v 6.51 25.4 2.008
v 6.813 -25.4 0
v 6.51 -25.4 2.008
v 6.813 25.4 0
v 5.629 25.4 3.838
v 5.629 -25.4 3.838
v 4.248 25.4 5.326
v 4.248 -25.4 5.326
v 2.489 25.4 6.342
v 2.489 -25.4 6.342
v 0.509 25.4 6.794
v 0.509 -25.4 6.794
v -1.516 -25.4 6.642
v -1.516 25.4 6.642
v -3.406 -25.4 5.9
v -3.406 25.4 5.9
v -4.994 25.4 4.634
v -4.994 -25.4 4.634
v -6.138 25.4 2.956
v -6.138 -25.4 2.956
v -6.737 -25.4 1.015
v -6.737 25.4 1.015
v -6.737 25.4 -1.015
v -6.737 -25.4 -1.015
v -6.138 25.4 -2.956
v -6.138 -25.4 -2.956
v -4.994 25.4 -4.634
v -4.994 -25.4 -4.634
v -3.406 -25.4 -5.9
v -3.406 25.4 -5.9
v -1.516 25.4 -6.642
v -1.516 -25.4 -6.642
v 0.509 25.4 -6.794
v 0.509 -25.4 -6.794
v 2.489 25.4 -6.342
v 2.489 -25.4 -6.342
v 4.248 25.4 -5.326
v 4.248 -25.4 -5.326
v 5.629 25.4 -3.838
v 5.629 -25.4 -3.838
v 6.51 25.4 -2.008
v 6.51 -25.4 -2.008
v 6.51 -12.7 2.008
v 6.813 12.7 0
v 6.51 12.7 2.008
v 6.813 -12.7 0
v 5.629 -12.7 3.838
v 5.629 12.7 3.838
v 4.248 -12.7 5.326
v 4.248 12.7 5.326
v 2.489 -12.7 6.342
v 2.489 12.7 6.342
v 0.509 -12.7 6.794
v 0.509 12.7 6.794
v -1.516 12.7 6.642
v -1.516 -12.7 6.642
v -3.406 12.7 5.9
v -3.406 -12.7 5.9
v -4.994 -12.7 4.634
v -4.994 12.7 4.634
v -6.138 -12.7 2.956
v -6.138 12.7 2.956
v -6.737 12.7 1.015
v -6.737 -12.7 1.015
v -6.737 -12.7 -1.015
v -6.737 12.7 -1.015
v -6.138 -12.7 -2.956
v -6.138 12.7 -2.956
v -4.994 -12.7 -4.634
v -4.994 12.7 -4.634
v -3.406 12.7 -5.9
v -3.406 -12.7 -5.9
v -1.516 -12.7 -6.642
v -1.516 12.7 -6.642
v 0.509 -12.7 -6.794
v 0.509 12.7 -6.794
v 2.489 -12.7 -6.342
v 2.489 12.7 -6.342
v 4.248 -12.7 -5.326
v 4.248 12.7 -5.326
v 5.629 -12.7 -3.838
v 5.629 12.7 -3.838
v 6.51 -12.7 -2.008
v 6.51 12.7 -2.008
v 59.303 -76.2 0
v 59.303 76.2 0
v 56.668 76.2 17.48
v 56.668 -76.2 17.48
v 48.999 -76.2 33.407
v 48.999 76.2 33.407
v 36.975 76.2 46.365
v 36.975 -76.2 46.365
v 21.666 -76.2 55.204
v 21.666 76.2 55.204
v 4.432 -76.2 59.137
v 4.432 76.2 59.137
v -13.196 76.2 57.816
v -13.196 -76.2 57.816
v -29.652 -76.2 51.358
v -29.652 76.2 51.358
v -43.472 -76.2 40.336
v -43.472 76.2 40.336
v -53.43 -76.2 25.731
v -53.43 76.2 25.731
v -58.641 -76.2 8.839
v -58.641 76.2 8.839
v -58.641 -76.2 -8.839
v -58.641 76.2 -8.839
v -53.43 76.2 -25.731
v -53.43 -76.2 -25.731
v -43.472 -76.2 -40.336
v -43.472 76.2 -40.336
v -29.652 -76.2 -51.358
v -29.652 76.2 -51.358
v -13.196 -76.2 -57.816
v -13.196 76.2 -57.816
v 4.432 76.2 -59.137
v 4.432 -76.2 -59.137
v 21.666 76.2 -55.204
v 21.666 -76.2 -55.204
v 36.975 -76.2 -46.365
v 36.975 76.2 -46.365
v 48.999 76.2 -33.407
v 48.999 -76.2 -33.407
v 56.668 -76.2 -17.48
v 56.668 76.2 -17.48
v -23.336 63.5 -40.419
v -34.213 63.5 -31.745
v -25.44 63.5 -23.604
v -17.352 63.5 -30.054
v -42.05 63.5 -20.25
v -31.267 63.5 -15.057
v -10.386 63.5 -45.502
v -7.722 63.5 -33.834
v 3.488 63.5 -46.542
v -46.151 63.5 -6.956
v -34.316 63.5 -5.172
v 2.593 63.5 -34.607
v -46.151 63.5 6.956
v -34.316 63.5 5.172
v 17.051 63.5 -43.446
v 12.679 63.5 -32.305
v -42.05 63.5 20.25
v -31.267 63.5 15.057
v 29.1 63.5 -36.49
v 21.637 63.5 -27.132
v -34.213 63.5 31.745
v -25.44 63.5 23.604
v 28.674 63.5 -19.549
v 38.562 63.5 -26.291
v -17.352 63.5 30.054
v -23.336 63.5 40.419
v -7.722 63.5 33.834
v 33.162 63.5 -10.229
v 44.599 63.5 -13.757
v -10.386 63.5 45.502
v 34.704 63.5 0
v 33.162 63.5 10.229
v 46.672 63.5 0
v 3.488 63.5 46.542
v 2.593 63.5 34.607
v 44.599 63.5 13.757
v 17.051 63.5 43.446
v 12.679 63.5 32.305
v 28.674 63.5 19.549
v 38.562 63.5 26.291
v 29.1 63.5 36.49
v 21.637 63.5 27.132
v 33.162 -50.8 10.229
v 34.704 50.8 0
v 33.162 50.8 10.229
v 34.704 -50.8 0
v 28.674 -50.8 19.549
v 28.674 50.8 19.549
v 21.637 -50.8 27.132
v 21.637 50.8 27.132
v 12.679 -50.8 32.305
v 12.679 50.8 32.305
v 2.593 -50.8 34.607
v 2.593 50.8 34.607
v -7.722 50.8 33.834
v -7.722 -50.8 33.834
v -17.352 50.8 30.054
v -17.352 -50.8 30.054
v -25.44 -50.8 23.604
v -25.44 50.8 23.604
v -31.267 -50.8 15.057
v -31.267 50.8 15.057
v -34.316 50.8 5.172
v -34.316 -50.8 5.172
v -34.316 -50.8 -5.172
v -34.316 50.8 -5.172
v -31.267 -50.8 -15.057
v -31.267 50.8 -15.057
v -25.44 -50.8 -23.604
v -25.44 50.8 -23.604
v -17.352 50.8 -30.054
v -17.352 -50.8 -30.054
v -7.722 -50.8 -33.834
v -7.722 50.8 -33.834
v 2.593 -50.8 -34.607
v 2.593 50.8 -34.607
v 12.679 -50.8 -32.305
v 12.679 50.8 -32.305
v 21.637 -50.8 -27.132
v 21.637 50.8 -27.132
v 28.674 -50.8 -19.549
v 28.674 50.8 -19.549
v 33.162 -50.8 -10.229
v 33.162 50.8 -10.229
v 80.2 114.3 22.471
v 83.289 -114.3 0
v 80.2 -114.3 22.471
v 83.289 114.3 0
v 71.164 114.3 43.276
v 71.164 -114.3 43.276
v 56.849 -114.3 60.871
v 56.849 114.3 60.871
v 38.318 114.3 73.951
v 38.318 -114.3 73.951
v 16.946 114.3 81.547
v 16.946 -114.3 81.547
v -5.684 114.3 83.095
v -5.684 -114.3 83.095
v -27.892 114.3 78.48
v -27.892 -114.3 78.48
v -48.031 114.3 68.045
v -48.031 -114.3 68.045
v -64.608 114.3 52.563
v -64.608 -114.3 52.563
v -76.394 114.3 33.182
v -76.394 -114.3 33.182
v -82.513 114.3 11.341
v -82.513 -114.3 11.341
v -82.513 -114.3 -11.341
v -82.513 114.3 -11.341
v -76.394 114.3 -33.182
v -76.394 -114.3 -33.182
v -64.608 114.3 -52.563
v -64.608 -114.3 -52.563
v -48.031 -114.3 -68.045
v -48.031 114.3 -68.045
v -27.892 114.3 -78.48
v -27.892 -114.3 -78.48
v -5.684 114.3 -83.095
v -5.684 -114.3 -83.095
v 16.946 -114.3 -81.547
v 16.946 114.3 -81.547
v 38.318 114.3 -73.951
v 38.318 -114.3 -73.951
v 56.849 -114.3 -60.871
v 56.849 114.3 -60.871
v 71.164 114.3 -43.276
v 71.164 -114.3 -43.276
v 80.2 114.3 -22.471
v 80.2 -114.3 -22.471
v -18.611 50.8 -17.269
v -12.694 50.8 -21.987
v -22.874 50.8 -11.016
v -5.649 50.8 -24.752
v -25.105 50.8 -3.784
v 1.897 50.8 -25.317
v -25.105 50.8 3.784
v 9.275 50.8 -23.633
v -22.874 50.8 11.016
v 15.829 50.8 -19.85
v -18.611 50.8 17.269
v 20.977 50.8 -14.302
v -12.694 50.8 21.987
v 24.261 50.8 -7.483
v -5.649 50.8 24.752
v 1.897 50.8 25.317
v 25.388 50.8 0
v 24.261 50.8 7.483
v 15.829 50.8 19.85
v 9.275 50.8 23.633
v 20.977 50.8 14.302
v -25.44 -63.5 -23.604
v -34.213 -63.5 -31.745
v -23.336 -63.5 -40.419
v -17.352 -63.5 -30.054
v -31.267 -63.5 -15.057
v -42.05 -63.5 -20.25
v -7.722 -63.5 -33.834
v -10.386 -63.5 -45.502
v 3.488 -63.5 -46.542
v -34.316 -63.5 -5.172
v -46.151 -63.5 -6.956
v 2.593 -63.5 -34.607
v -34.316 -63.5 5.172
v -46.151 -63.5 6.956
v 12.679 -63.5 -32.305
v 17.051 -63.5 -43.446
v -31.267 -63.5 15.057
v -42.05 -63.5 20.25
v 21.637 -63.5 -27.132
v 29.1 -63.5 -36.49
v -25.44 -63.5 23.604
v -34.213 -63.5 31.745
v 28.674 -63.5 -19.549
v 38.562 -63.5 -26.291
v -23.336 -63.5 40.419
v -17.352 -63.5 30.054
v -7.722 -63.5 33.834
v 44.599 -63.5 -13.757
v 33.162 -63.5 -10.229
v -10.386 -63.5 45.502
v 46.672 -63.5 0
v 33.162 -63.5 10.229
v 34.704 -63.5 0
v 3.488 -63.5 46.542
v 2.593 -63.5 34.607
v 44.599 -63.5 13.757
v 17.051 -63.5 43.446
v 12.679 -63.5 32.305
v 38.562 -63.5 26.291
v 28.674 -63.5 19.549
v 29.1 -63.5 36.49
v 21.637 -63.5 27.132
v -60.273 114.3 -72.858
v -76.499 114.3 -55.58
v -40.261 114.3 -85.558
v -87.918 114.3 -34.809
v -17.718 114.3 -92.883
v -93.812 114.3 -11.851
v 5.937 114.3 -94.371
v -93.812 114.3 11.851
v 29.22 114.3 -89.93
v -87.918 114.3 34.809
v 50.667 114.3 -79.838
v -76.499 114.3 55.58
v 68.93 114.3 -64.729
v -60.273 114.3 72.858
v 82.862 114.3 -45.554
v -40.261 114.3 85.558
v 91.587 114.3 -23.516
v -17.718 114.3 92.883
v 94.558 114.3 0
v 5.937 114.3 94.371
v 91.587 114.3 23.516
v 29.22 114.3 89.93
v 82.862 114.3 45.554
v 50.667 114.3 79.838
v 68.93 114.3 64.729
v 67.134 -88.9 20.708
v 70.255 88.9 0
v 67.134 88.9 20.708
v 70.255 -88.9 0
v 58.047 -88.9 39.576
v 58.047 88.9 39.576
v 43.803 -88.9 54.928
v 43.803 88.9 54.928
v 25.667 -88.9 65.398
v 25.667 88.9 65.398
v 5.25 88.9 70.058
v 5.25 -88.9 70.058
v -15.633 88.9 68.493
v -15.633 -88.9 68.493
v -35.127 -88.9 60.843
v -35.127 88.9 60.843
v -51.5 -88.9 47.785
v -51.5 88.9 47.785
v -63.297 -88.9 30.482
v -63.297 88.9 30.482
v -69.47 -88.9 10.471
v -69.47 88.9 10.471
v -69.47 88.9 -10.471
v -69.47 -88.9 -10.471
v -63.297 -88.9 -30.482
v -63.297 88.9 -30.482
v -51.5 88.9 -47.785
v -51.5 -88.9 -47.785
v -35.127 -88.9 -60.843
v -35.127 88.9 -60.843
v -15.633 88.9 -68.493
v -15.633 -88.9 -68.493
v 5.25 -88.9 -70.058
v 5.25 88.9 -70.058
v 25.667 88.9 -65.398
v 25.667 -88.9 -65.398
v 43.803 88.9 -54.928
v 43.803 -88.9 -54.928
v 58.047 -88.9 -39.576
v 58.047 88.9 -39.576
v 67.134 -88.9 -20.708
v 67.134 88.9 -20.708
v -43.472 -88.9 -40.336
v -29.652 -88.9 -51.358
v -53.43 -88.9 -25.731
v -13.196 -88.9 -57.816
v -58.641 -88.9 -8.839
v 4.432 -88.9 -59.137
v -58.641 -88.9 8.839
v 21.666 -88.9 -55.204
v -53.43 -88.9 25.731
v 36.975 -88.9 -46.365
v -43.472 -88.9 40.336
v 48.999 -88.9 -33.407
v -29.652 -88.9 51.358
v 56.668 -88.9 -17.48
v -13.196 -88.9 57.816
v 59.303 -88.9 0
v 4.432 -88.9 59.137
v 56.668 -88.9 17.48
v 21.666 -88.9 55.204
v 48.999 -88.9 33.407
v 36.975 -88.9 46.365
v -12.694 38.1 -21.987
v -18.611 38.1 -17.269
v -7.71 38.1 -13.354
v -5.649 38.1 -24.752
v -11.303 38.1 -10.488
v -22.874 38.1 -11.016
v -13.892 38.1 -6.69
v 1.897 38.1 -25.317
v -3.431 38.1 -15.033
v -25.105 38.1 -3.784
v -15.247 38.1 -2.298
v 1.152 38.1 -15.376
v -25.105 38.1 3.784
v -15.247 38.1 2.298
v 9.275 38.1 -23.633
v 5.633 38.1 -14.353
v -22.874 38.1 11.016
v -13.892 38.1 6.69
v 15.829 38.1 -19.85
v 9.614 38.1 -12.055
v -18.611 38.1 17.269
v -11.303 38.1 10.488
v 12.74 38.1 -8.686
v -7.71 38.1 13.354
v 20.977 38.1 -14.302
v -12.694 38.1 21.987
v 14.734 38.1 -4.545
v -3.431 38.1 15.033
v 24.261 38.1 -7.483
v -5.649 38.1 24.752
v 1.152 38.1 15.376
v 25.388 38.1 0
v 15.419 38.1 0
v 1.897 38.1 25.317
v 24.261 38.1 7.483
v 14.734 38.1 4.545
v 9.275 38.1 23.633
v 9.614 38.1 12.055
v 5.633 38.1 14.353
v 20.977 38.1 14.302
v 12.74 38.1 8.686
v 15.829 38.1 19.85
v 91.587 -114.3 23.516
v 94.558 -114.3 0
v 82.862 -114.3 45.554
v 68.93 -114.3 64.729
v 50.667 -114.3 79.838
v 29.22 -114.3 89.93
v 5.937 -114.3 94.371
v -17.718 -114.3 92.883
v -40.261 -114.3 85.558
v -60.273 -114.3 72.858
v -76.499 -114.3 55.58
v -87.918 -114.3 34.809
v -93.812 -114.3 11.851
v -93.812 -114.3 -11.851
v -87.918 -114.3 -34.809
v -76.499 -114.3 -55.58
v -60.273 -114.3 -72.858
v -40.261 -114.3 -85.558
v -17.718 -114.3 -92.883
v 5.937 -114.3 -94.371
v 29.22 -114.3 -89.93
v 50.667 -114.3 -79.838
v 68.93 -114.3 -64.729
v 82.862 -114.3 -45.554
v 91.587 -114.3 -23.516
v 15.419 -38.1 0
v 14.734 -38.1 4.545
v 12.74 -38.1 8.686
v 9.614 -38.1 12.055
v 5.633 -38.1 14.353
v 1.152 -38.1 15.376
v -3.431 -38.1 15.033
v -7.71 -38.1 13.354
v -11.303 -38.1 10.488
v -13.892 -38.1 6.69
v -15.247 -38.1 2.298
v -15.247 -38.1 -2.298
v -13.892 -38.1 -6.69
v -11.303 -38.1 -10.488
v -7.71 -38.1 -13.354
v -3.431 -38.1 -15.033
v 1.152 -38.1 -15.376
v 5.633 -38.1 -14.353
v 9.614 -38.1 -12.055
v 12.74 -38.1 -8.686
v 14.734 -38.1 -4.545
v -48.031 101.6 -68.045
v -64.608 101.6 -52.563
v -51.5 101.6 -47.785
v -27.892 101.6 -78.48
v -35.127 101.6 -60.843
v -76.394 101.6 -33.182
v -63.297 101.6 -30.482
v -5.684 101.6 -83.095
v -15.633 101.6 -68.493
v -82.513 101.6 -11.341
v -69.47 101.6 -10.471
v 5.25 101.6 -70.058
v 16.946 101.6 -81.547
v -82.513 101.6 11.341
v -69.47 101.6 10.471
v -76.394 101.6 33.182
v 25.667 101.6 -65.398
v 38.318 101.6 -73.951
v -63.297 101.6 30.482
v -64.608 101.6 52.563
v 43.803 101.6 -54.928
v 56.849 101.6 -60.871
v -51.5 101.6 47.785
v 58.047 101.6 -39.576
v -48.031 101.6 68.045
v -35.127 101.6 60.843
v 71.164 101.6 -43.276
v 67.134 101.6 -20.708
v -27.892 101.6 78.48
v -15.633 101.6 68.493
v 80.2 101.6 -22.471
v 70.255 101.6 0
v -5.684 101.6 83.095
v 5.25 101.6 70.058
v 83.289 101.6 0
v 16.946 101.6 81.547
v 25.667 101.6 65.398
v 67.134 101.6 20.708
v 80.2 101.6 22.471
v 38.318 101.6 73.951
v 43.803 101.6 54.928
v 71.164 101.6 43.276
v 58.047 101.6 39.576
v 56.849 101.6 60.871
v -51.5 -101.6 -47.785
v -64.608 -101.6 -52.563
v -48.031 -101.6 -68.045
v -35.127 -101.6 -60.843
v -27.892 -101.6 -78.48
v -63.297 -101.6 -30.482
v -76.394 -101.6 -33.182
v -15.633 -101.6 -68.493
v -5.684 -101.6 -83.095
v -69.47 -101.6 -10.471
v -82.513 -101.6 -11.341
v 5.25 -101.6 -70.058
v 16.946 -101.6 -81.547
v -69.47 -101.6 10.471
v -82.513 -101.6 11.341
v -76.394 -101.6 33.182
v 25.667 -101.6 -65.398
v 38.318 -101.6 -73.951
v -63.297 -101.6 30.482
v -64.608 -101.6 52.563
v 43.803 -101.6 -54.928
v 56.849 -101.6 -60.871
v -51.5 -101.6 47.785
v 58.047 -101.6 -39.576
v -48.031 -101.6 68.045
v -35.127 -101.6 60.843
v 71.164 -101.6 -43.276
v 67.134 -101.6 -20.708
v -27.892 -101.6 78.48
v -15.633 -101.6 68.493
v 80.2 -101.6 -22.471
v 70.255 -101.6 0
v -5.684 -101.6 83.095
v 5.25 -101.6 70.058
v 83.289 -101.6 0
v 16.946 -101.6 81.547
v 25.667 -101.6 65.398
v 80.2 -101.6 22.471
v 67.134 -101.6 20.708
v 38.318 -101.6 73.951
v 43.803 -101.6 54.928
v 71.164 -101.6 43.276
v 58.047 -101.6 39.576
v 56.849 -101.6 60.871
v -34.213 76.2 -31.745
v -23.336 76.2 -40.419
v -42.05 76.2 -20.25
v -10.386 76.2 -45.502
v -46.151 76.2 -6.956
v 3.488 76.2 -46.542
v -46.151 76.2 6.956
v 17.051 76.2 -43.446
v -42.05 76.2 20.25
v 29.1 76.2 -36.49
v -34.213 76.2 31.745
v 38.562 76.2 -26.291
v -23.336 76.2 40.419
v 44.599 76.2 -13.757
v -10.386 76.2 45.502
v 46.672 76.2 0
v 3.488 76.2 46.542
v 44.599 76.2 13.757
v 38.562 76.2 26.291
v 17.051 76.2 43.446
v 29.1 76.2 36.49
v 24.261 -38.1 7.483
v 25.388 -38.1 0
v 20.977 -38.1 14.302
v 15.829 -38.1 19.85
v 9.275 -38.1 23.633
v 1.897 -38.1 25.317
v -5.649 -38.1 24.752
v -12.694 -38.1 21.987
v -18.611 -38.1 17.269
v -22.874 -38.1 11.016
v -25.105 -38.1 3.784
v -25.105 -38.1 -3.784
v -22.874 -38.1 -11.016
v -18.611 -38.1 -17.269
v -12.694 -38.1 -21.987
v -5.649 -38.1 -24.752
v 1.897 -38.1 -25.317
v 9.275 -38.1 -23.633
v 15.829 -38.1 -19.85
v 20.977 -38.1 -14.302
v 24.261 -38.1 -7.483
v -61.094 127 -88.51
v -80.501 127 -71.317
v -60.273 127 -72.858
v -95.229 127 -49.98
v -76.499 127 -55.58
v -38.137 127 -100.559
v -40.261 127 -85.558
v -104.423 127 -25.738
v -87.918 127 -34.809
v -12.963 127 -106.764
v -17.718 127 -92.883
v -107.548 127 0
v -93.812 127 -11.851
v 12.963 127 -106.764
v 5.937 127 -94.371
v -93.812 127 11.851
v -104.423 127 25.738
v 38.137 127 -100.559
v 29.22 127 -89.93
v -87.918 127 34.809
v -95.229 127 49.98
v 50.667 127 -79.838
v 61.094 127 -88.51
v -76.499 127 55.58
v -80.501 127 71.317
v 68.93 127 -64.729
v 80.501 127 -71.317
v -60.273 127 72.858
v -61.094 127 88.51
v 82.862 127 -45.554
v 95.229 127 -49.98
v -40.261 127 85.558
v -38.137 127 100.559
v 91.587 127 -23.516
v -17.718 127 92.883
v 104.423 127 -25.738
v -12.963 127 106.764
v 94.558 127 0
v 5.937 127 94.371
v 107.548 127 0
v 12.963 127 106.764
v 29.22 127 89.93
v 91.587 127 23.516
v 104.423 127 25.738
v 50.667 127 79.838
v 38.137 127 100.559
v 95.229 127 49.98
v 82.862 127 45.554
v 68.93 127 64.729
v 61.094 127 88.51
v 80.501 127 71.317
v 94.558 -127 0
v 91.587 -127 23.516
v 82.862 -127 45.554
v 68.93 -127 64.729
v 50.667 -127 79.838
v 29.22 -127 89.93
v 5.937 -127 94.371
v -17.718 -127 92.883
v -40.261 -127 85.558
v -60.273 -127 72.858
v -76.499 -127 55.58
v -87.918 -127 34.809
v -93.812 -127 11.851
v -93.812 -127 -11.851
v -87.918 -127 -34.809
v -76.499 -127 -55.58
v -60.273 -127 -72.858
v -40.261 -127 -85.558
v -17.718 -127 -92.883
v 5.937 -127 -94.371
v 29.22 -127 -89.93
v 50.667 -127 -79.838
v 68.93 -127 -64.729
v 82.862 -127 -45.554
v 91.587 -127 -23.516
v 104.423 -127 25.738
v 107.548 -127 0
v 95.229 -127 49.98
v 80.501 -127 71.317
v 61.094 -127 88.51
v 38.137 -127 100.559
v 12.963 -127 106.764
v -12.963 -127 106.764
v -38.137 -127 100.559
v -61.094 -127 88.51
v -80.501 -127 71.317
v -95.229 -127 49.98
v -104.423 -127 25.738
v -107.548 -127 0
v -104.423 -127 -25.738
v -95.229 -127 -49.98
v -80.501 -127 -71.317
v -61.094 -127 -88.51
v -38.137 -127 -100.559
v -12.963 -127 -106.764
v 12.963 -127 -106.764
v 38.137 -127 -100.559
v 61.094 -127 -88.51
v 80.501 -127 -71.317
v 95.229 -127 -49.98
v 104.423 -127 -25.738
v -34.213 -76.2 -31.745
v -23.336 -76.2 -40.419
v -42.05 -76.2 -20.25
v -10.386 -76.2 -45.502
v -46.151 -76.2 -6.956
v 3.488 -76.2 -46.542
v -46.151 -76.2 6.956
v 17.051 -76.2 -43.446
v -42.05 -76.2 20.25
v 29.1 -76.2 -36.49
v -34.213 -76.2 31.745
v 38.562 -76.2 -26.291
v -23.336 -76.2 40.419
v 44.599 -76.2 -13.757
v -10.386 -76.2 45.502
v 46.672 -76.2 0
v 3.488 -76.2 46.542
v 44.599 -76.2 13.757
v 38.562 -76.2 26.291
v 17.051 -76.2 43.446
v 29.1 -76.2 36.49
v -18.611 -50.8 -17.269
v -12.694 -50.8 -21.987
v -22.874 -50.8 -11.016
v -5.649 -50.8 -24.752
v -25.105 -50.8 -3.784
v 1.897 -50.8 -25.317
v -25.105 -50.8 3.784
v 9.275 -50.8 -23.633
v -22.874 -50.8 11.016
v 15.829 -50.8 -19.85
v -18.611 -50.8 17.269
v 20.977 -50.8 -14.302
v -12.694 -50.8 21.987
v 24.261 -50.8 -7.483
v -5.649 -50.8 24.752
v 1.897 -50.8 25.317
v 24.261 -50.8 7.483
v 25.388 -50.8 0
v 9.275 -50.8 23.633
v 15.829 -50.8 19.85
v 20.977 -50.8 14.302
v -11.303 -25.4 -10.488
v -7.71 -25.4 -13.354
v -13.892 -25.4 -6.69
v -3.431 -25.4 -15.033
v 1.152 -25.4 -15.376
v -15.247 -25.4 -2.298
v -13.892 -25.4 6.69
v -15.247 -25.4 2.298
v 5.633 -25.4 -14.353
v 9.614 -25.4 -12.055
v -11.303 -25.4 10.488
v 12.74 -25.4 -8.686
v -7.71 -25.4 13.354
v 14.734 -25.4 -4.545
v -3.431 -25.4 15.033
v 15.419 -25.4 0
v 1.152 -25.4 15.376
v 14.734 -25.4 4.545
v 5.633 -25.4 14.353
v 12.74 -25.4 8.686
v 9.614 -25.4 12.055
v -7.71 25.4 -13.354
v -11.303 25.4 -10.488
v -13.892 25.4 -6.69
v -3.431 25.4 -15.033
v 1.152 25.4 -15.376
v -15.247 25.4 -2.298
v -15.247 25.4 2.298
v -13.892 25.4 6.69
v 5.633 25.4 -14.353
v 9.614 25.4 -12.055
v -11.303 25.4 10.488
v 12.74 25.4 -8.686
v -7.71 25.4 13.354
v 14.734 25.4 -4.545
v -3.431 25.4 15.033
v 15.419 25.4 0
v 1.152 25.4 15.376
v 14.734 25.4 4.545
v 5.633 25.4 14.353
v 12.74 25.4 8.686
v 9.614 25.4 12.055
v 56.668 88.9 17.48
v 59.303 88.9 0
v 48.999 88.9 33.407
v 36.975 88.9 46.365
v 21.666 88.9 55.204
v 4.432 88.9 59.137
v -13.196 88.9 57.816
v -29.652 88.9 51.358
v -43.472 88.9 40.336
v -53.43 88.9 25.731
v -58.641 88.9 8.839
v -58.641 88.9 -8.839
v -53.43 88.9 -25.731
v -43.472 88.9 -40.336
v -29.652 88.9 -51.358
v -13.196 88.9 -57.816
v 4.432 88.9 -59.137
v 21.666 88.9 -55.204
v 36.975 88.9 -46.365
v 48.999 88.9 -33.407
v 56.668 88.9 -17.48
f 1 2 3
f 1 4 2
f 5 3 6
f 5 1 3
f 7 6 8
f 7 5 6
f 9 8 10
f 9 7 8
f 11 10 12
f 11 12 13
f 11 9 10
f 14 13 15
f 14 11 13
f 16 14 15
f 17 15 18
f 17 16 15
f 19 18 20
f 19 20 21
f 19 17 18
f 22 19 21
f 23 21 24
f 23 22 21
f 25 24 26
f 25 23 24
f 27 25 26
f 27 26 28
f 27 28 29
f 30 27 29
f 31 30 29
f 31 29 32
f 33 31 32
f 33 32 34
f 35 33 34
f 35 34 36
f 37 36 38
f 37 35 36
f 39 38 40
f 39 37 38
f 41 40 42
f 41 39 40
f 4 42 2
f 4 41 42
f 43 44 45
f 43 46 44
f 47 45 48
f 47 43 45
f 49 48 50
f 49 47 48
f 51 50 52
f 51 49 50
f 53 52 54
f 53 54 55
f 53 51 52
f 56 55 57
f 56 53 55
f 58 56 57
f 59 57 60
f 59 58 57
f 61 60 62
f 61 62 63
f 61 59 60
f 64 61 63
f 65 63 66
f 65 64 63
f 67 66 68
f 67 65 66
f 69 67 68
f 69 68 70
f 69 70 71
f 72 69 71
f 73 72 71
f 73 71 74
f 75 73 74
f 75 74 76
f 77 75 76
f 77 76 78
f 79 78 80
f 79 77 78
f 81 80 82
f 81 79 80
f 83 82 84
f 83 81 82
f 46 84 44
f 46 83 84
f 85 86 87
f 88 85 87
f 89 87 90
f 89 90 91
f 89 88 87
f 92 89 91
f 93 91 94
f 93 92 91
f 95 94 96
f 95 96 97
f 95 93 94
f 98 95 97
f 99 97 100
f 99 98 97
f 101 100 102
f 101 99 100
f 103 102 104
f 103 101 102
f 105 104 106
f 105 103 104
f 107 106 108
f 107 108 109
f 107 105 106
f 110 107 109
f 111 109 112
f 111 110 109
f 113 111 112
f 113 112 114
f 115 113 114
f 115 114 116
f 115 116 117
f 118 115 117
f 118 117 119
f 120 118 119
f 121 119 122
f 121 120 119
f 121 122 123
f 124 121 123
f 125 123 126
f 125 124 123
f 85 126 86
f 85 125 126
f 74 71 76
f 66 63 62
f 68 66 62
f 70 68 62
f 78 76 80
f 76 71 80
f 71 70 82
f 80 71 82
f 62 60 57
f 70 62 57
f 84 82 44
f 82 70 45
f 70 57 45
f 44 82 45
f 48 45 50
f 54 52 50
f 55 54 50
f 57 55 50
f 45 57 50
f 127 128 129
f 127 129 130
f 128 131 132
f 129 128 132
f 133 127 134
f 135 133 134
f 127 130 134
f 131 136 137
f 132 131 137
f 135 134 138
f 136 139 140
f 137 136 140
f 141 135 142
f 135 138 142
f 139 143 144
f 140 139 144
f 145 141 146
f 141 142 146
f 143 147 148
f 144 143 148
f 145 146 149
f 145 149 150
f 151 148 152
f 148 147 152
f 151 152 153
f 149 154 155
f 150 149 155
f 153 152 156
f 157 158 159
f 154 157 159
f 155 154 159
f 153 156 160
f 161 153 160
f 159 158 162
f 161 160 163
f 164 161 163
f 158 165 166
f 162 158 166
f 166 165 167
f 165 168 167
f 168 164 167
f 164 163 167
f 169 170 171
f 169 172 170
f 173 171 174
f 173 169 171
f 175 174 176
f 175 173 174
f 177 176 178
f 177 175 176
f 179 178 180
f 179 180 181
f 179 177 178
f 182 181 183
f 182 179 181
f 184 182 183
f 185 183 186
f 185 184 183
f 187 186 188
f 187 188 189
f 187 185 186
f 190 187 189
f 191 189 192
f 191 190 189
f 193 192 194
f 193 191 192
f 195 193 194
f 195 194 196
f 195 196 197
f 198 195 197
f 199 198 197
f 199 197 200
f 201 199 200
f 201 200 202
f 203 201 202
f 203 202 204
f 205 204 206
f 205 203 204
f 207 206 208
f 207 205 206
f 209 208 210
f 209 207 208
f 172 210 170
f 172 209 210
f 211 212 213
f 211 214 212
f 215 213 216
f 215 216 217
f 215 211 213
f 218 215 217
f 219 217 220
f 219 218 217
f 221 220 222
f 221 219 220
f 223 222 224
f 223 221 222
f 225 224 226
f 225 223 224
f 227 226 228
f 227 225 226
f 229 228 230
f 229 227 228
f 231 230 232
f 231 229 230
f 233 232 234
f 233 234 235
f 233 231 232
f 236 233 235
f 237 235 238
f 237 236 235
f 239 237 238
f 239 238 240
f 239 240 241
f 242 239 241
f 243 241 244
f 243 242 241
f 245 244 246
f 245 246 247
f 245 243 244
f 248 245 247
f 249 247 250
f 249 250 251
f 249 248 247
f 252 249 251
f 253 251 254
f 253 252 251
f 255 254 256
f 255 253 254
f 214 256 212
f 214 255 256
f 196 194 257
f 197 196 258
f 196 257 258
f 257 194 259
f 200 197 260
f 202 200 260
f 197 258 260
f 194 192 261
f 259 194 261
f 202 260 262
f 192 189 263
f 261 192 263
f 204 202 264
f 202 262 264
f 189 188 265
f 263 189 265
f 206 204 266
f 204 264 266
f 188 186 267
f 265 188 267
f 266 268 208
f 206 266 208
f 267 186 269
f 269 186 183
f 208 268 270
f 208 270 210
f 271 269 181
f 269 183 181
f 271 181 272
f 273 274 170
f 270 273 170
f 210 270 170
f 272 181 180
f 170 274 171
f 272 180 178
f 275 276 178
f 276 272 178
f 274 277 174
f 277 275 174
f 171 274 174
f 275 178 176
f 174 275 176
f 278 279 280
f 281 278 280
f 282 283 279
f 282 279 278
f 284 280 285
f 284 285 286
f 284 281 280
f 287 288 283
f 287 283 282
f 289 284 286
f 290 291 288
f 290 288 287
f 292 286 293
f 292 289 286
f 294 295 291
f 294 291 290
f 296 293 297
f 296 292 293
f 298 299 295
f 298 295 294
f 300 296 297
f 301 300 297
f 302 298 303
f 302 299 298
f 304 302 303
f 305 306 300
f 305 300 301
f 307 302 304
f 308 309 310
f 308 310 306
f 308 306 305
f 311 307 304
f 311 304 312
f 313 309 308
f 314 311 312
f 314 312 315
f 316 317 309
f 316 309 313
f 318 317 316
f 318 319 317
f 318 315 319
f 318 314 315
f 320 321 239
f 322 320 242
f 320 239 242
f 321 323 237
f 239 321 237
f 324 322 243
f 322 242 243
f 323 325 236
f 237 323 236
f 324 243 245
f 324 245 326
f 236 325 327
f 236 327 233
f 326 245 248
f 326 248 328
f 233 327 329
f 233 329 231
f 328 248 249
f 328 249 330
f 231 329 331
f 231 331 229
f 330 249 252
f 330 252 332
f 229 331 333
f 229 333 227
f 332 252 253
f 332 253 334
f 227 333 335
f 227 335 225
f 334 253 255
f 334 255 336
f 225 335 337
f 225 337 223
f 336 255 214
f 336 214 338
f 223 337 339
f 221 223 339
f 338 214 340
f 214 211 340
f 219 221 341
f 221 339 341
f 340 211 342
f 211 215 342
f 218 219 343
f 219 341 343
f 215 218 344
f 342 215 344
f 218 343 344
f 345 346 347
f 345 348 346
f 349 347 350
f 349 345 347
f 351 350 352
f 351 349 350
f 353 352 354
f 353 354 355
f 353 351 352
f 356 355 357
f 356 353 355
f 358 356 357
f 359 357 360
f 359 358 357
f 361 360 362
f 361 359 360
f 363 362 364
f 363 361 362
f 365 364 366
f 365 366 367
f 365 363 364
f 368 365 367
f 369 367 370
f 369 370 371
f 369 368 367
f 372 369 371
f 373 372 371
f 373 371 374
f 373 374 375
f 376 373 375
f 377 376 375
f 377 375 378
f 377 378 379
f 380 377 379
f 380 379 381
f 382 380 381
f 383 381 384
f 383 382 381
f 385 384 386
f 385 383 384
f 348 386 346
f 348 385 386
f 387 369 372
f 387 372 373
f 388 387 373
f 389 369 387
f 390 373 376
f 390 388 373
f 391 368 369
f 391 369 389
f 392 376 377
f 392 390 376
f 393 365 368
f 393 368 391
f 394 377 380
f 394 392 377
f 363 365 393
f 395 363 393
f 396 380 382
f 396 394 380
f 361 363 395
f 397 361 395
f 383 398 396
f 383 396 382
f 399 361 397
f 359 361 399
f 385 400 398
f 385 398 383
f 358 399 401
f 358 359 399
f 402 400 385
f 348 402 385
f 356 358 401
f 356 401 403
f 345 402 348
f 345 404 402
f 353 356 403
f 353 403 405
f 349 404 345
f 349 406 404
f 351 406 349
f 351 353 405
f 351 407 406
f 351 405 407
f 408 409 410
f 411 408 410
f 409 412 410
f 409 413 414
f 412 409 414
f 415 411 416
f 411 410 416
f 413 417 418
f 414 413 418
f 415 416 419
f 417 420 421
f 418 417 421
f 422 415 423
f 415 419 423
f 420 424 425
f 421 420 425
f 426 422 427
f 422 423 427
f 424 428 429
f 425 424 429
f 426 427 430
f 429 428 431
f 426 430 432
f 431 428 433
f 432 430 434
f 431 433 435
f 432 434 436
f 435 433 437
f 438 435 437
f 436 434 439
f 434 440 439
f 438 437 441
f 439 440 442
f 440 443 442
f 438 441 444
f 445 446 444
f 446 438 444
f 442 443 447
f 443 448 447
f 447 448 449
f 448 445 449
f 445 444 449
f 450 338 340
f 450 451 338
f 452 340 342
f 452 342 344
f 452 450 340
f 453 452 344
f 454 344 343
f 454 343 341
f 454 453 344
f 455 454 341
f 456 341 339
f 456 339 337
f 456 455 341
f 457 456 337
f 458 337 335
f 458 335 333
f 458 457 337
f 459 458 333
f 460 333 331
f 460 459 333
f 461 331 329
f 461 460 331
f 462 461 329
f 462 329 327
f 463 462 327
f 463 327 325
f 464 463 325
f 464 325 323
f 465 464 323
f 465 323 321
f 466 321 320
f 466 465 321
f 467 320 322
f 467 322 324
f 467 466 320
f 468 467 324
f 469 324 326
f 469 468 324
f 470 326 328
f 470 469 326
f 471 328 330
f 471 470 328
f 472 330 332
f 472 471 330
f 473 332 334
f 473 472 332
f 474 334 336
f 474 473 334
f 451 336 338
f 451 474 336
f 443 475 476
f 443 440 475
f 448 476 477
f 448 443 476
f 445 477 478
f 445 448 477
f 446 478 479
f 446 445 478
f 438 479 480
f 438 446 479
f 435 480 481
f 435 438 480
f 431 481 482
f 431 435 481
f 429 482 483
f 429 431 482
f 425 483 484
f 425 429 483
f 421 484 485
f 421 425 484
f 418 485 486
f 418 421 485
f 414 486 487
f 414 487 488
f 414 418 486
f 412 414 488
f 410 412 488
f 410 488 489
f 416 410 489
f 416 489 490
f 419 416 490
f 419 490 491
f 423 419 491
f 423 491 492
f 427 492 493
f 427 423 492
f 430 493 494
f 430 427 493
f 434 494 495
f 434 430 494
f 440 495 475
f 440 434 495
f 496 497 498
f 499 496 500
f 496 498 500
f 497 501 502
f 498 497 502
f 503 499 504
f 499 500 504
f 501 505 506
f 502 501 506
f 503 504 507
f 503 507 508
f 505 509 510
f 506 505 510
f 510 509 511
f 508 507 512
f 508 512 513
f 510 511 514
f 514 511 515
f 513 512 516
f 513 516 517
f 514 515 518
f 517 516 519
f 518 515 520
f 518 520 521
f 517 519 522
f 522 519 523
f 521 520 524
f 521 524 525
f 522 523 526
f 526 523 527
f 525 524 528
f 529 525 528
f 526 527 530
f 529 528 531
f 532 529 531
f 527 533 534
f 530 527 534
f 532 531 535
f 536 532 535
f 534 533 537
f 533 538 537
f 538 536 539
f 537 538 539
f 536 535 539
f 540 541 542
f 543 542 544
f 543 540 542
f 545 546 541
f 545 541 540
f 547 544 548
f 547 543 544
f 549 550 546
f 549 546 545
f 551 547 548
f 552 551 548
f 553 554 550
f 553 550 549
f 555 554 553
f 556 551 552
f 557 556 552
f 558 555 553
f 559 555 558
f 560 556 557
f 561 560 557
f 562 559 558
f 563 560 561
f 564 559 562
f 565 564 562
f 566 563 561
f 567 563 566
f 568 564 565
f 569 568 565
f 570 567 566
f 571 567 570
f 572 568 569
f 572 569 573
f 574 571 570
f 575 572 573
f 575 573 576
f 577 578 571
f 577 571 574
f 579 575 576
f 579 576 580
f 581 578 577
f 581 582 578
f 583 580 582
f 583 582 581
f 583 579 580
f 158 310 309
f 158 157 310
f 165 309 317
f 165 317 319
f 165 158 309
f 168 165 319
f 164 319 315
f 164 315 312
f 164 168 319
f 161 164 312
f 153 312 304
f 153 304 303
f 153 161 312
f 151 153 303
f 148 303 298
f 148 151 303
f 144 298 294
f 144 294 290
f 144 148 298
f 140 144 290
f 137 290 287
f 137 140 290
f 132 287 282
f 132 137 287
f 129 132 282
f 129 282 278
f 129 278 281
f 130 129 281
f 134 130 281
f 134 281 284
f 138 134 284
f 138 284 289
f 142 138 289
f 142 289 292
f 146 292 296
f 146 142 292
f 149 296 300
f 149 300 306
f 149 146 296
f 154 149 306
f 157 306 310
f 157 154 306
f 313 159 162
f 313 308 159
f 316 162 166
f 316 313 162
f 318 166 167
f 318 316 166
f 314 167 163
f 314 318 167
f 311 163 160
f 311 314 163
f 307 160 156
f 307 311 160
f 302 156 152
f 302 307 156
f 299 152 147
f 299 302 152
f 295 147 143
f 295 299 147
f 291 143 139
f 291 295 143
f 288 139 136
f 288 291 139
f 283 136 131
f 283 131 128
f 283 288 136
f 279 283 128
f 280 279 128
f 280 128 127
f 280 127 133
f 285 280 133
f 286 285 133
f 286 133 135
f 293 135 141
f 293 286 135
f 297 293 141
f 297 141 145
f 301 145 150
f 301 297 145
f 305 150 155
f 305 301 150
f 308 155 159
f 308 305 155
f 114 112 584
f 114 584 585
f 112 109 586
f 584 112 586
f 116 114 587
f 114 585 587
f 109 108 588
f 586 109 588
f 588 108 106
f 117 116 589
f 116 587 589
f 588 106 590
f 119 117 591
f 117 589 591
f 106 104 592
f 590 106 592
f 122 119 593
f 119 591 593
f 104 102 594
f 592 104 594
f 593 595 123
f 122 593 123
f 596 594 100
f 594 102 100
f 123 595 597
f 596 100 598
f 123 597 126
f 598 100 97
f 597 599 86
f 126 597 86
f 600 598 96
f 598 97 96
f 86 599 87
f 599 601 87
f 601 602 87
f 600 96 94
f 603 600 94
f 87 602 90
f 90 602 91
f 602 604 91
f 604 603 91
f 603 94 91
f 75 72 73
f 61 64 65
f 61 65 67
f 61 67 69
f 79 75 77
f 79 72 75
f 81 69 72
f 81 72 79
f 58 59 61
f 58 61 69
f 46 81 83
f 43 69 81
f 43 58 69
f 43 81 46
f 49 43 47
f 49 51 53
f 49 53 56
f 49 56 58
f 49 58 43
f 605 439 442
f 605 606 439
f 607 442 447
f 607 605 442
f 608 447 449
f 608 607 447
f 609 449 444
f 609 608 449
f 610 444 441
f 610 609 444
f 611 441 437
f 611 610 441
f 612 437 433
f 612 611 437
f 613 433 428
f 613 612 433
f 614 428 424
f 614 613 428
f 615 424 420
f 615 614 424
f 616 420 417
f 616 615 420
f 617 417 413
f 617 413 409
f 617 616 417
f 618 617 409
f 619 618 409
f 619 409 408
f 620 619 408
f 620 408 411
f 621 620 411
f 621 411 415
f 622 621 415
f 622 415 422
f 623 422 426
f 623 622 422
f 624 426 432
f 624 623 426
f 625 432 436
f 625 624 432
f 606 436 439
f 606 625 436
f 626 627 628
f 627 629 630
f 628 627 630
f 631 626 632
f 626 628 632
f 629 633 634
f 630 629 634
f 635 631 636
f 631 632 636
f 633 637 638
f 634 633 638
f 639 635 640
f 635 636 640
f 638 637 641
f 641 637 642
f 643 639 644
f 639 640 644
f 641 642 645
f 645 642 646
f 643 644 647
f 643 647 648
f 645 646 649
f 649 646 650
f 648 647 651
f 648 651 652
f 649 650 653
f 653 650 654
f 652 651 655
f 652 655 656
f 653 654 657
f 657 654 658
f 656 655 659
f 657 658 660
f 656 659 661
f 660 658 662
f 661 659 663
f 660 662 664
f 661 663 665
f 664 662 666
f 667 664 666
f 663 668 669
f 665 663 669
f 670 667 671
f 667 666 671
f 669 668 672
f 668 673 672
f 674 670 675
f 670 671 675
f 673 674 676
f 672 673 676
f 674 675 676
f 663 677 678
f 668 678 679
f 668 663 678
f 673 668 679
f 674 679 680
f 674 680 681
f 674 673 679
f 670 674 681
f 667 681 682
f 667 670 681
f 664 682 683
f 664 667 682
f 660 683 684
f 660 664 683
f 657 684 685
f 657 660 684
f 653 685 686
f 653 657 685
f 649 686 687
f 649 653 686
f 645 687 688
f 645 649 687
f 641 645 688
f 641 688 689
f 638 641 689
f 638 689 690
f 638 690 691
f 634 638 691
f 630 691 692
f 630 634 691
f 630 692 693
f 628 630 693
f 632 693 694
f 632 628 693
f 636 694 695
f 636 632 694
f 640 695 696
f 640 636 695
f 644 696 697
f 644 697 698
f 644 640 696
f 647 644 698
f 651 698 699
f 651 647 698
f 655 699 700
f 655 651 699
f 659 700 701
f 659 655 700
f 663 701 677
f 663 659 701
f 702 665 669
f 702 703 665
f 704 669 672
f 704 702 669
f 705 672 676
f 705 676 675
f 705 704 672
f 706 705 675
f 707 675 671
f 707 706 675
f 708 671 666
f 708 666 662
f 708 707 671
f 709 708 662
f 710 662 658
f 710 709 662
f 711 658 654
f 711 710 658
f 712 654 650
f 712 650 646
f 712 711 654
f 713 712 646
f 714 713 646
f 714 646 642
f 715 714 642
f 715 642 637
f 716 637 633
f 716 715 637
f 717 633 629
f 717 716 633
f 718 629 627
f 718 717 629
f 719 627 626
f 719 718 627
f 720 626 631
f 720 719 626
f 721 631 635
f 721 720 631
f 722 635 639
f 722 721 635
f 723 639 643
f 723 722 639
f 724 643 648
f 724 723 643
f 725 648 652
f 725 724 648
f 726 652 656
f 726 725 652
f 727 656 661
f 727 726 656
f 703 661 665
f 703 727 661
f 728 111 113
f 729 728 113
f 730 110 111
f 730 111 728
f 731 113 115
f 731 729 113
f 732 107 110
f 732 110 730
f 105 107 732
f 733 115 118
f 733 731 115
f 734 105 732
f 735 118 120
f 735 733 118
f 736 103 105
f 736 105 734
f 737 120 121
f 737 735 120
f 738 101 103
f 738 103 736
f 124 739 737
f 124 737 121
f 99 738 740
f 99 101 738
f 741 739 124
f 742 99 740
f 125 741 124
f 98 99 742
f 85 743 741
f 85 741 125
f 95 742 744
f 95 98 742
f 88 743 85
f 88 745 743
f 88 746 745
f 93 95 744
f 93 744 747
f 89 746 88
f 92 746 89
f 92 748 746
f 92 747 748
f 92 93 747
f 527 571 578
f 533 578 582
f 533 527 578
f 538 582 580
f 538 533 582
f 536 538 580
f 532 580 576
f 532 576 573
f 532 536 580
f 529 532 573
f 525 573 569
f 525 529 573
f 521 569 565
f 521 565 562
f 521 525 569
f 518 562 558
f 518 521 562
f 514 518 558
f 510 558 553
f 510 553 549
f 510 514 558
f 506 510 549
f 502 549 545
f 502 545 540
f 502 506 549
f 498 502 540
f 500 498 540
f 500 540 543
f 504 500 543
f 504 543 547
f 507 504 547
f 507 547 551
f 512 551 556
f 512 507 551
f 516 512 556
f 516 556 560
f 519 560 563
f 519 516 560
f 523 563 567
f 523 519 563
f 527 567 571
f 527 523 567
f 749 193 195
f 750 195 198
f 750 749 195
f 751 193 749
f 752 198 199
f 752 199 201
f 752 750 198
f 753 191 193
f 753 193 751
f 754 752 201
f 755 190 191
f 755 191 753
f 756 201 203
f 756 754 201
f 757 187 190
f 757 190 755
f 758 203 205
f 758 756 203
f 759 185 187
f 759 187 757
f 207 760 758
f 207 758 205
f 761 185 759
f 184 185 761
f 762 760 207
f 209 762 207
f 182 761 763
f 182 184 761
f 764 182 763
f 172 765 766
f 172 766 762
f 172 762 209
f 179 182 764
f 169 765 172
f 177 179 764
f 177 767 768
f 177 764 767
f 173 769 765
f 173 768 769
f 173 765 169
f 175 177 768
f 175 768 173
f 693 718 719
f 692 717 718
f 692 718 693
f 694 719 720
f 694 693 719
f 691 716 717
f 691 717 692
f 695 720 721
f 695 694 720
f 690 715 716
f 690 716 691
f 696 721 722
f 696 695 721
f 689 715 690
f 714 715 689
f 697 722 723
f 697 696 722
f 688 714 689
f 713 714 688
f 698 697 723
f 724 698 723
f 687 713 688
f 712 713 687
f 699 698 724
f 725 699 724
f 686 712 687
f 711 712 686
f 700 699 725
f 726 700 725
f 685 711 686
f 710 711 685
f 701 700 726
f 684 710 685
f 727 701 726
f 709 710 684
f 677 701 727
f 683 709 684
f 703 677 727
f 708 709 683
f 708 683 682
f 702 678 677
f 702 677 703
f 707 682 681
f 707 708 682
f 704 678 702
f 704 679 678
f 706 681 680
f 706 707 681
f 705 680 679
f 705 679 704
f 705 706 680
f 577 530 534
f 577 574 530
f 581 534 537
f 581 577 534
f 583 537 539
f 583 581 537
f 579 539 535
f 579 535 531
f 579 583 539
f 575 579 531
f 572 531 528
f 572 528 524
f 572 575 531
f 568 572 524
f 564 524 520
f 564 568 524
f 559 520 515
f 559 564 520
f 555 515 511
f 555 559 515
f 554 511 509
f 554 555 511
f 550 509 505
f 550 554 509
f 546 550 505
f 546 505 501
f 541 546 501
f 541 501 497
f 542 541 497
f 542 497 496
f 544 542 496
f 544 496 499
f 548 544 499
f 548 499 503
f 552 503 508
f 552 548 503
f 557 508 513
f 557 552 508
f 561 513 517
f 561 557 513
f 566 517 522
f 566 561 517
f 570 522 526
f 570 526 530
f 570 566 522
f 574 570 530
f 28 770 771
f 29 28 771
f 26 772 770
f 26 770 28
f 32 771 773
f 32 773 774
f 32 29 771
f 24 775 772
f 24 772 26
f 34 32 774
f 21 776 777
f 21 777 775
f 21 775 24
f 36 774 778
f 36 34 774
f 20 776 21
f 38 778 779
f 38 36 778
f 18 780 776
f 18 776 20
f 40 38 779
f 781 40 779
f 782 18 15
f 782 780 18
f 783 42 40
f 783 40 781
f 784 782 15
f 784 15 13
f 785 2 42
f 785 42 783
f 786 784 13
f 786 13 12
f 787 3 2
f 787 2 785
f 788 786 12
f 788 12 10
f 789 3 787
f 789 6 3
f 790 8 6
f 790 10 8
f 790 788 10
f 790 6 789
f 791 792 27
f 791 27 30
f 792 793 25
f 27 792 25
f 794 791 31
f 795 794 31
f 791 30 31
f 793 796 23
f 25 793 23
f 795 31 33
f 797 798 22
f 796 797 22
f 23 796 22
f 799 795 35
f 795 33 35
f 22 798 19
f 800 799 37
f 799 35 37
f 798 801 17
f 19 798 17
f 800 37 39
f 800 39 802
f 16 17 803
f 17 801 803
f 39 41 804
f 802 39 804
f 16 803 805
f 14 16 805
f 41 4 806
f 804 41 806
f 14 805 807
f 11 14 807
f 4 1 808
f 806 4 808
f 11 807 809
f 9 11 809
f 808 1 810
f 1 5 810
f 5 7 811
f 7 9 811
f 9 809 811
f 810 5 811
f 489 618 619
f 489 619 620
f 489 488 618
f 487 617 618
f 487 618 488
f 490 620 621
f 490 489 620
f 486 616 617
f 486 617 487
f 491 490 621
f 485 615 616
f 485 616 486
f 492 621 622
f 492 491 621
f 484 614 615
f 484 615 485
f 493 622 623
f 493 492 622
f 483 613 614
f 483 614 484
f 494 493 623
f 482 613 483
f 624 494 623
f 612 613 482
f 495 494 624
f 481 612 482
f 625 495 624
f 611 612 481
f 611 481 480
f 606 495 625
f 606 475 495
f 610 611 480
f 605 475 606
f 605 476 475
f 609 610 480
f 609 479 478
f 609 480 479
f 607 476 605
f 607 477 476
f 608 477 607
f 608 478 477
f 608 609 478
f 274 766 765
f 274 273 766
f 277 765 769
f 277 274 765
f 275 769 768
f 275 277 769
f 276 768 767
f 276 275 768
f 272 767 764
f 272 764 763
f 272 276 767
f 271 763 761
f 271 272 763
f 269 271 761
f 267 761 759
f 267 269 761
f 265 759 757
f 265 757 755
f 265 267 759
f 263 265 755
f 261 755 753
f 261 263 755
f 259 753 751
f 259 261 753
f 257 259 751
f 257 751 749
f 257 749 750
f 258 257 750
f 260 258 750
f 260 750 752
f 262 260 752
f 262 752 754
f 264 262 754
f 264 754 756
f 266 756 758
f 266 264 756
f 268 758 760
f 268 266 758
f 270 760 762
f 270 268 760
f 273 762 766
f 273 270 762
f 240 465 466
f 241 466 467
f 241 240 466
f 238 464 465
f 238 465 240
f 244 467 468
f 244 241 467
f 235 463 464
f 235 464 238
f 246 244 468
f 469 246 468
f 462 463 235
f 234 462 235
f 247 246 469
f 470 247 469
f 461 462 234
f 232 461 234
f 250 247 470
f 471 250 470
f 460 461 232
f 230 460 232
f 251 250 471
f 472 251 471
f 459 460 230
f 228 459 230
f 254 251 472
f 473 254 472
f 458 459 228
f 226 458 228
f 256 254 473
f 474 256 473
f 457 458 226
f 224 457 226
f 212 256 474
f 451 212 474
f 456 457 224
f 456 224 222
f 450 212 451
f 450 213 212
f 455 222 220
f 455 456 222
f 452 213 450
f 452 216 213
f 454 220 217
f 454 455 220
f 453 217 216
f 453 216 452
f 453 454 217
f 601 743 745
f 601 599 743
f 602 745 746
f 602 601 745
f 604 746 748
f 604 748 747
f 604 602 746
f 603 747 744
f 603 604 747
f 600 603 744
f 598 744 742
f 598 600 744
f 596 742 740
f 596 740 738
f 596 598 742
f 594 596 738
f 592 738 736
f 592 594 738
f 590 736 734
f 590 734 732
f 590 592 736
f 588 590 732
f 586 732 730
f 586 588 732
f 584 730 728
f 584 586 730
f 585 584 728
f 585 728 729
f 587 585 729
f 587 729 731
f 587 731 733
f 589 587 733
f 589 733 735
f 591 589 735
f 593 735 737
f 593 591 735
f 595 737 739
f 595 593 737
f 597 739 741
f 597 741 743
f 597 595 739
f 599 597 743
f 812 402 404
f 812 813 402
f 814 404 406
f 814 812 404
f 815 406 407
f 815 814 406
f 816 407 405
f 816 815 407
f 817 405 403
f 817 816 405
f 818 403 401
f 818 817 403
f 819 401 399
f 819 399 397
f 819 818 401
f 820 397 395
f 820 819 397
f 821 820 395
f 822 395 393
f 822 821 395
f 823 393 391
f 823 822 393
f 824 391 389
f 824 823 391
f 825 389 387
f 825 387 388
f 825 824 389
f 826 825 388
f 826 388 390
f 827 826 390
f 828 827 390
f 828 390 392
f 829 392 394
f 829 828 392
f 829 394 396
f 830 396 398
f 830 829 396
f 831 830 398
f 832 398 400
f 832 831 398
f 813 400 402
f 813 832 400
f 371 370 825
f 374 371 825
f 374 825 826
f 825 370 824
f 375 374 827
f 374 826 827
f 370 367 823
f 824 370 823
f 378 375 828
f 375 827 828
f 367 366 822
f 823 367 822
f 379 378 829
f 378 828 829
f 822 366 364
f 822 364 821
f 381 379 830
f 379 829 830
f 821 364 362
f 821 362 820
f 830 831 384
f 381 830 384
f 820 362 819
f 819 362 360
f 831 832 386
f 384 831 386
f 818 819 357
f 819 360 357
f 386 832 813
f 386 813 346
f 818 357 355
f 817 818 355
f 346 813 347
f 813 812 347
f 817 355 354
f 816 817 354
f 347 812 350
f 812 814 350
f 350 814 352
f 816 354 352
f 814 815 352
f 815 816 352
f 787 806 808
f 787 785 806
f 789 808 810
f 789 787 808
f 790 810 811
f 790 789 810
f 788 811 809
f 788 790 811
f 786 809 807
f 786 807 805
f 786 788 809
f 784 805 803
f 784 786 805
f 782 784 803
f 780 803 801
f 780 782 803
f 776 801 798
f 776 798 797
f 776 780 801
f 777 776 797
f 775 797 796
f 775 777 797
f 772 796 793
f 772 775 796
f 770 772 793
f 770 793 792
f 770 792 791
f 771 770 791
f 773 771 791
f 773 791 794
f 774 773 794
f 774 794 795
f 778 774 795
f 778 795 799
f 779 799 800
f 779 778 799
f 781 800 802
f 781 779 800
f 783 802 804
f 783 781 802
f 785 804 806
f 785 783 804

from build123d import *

# Parameters (mm, degrees)
F0_R      = 6.812818
F1_DEPTH  = 12.7
F0_R_2    = 15.4193
F2_DEPTH  = 25.4
F0_R_3    = 25.388469
F3_DEPTH  = 38.1
F0_R_4    = 34.703674
F4_DEPTH  = 50.8
F0_R_5    = 46.672038
F5_DEPTH  = 63.5
F0_R_6    = 59.303122
F6_DEPTH  = 76.2
F0_R_7    = 70.254915
F7_DEPTH  = 88.9
F0_R_8    = 83.288936
F8_DEPTH  = 101.6
F0_R_9    = 94.557674
F9_DEPTH  = 114.3
F0_R_10   = 107.547783
F10_DEPTH = 127


with BuildPart() as f1:
    # F0 (on Front) → F1 (new body, symmetric)
    with BuildSketch(Plane.XZ):
        Circle(F0_R)
    extrude(amount=F1_DEPTH, both=True)


with BuildPart() as f2:
    # F0 (on Front) → F2 (new body, symmetric)
    with BuildSketch(Plane.XZ):
        Circle(F0_R_2)
        Circle(F0_R, mode=Mode.SUBTRACT)
    extrude(amount=F2_DEPTH, both=True)


with BuildPart() as f3:
    # F0 (on Front) → F3 (new body, symmetric)
    with BuildSketch(Plane.XZ):
        Circle(F0_R_3)
        Circle(F0_R_2, mode=Mode.SUBTRACT)
    extrude(amount=F3_DEPTH, both=True)


with BuildPart() as f4:
    # F0 (on Front) → F4 (new body, symmetric)
    with BuildSketch(Plane.XZ):
        Circle(F0_R_4)
        Circle(F0_R_3, mode=Mode.SUBTRACT)
    extrude(amount=F4_DEPTH, both=True)


with BuildPart() as f5:
    # F0 (on Front) → F5 (new body, symmetric)
    with BuildSketch(Plane.XZ):
        Circle(F0_R_5)
        Circle(F0_R_4, mode=Mode.SUBTRACT)
    extrude(amount=F5_DEPTH, both=True)


with BuildPart() as f6:
    # F0 (on Front) → F6 (new body, symmetric)
    with BuildSketch(Plane.XZ):
        Circle(F0_R_6)
        Circle(F0_R_5, mode=Mode.SUBTRACT)
    extrude(amount=F6_DEPTH, both=True)


with BuildPart() as f7:
    # F0 (on Front) → F7 (new body, symmetric)
    with BuildSketch(Plane.XZ):
        Circle(F0_R_7)
        Circle(F0_R_6, mode=Mode.SUBTRACT)
    extrude(amount=F7_DEPTH, both=True)


with BuildPart() as f8:
    # F0 (on Front) → F8 (new body, symmetric)
    with BuildSketch(Plane.XZ):
        Circle(F0_R_8)
        Circle(F0_R_7, mode=Mode.SUBTRACT)
    extrude(amount=F8_DEPTH, both=True)


with BuildPart() as f9:
    # F0 (on Front) → F9 (new body, symmetric)
    with BuildSketch(Plane.XZ):
        Circle(F0_R_9)
        Circle(F0_R_8, mode=Mode.SUBTRACT)
    extrude(amount=F9_DEPTH, both=True)


with BuildPart() as f10:
    # F0 (on Front) → F10 (new body, symmetric)
    with BuildSketch(Plane.XZ):
        Circle(F0_R_10)
        Circle(F0_R_9, mode=Mode.SUBTRACT)
    extrude(amount=F10_DEPTH, both=True)


solid = Compound([f1.part, f2.part, f3.part, f4.part, f5.part, f6.part, f7.part, f8.part, f9.part, f10.part])
